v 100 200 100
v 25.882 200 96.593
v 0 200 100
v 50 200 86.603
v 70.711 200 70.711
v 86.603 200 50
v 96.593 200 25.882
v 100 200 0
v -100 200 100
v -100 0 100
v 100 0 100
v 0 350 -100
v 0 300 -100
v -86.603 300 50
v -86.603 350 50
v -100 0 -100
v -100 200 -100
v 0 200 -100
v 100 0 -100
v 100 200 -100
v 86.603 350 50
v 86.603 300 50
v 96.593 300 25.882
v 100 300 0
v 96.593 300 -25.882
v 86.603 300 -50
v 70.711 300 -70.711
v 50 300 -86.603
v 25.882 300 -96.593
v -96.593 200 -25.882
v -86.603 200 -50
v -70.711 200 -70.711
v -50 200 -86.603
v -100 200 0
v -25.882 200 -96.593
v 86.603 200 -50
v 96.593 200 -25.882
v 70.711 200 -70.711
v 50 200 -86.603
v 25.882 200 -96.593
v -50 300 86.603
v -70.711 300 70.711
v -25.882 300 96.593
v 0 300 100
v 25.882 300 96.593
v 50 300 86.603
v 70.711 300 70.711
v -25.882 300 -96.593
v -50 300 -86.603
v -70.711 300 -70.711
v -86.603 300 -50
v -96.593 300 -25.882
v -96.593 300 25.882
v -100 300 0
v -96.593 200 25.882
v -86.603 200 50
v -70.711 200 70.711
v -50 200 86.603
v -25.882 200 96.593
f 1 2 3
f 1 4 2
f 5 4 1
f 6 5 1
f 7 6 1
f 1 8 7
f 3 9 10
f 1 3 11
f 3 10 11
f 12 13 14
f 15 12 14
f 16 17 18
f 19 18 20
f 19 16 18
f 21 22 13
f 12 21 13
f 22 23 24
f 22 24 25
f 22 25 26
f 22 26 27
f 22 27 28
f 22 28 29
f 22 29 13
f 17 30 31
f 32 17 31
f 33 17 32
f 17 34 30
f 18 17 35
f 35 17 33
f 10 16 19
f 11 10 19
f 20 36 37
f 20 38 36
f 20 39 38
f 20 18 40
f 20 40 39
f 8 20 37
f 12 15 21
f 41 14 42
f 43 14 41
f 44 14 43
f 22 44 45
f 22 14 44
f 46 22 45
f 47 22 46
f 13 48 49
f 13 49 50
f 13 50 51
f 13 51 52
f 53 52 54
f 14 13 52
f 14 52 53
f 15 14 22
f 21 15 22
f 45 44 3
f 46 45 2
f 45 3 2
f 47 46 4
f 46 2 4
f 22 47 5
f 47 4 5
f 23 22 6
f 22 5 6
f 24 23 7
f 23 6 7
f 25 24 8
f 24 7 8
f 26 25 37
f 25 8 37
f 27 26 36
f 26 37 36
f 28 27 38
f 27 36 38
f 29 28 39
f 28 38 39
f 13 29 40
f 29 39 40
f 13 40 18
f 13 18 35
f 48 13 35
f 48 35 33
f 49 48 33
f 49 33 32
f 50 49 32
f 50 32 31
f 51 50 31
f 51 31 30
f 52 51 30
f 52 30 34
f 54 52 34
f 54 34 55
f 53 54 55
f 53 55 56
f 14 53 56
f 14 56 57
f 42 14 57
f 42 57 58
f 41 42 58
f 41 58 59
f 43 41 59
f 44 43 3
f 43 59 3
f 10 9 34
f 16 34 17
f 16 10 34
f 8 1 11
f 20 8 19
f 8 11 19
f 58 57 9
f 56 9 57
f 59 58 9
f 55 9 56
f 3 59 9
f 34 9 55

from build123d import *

# Parameters (mm, degrees)
SKETCH1_W           = 200
SKETCH1_H           = 200
BOSS_EXTRUDE2_DEPTH = 200
SKETCH3_R           = 100
BOSS_EXTRUDE3_DEPTH = 100
BOSS_EXTRUDE4_DEPTH = 50


with BuildPart() as part:
    # Sketch1 → Boss-Extrude2 (new body)
    with BuildSketch(Plane(origin=(0, 0, 0), x_dir=(1, 0, 0), z_dir=(0, 1, 0))):
        Rectangle(SKETCH1_W, SKETCH1_H)
    extrude(amount=BOSS_EXTRUDE2_DEPTH)

    # Sketch3 → Boss-Extrude3 (add)
    with BuildSketch(Plane(origin=(0, 200, 0), x_dir=(1, 0, 0), z_dir=(0, 1, 0))):
        with Locations(Location((0, 0, 0), (0, 0, 270))):
            Circle(SKETCH3_R)
    extrude(amount=BOSS_EXTRUDE3_DEPTH)

    # Sketch4 → Boss-Extrude4 (add)
    with BuildSketch(Plane(origin=(0, 300, 0), x_dir=(1, 0, 0), z_dir=(0, 1, 0))):
        Polygon((0, 100), (-86.602540378, -50), (86.602540378, -50), align=None)
    extrude(amount=BOSS_EXTRUDE4_DEPTH)


solid = part.part
